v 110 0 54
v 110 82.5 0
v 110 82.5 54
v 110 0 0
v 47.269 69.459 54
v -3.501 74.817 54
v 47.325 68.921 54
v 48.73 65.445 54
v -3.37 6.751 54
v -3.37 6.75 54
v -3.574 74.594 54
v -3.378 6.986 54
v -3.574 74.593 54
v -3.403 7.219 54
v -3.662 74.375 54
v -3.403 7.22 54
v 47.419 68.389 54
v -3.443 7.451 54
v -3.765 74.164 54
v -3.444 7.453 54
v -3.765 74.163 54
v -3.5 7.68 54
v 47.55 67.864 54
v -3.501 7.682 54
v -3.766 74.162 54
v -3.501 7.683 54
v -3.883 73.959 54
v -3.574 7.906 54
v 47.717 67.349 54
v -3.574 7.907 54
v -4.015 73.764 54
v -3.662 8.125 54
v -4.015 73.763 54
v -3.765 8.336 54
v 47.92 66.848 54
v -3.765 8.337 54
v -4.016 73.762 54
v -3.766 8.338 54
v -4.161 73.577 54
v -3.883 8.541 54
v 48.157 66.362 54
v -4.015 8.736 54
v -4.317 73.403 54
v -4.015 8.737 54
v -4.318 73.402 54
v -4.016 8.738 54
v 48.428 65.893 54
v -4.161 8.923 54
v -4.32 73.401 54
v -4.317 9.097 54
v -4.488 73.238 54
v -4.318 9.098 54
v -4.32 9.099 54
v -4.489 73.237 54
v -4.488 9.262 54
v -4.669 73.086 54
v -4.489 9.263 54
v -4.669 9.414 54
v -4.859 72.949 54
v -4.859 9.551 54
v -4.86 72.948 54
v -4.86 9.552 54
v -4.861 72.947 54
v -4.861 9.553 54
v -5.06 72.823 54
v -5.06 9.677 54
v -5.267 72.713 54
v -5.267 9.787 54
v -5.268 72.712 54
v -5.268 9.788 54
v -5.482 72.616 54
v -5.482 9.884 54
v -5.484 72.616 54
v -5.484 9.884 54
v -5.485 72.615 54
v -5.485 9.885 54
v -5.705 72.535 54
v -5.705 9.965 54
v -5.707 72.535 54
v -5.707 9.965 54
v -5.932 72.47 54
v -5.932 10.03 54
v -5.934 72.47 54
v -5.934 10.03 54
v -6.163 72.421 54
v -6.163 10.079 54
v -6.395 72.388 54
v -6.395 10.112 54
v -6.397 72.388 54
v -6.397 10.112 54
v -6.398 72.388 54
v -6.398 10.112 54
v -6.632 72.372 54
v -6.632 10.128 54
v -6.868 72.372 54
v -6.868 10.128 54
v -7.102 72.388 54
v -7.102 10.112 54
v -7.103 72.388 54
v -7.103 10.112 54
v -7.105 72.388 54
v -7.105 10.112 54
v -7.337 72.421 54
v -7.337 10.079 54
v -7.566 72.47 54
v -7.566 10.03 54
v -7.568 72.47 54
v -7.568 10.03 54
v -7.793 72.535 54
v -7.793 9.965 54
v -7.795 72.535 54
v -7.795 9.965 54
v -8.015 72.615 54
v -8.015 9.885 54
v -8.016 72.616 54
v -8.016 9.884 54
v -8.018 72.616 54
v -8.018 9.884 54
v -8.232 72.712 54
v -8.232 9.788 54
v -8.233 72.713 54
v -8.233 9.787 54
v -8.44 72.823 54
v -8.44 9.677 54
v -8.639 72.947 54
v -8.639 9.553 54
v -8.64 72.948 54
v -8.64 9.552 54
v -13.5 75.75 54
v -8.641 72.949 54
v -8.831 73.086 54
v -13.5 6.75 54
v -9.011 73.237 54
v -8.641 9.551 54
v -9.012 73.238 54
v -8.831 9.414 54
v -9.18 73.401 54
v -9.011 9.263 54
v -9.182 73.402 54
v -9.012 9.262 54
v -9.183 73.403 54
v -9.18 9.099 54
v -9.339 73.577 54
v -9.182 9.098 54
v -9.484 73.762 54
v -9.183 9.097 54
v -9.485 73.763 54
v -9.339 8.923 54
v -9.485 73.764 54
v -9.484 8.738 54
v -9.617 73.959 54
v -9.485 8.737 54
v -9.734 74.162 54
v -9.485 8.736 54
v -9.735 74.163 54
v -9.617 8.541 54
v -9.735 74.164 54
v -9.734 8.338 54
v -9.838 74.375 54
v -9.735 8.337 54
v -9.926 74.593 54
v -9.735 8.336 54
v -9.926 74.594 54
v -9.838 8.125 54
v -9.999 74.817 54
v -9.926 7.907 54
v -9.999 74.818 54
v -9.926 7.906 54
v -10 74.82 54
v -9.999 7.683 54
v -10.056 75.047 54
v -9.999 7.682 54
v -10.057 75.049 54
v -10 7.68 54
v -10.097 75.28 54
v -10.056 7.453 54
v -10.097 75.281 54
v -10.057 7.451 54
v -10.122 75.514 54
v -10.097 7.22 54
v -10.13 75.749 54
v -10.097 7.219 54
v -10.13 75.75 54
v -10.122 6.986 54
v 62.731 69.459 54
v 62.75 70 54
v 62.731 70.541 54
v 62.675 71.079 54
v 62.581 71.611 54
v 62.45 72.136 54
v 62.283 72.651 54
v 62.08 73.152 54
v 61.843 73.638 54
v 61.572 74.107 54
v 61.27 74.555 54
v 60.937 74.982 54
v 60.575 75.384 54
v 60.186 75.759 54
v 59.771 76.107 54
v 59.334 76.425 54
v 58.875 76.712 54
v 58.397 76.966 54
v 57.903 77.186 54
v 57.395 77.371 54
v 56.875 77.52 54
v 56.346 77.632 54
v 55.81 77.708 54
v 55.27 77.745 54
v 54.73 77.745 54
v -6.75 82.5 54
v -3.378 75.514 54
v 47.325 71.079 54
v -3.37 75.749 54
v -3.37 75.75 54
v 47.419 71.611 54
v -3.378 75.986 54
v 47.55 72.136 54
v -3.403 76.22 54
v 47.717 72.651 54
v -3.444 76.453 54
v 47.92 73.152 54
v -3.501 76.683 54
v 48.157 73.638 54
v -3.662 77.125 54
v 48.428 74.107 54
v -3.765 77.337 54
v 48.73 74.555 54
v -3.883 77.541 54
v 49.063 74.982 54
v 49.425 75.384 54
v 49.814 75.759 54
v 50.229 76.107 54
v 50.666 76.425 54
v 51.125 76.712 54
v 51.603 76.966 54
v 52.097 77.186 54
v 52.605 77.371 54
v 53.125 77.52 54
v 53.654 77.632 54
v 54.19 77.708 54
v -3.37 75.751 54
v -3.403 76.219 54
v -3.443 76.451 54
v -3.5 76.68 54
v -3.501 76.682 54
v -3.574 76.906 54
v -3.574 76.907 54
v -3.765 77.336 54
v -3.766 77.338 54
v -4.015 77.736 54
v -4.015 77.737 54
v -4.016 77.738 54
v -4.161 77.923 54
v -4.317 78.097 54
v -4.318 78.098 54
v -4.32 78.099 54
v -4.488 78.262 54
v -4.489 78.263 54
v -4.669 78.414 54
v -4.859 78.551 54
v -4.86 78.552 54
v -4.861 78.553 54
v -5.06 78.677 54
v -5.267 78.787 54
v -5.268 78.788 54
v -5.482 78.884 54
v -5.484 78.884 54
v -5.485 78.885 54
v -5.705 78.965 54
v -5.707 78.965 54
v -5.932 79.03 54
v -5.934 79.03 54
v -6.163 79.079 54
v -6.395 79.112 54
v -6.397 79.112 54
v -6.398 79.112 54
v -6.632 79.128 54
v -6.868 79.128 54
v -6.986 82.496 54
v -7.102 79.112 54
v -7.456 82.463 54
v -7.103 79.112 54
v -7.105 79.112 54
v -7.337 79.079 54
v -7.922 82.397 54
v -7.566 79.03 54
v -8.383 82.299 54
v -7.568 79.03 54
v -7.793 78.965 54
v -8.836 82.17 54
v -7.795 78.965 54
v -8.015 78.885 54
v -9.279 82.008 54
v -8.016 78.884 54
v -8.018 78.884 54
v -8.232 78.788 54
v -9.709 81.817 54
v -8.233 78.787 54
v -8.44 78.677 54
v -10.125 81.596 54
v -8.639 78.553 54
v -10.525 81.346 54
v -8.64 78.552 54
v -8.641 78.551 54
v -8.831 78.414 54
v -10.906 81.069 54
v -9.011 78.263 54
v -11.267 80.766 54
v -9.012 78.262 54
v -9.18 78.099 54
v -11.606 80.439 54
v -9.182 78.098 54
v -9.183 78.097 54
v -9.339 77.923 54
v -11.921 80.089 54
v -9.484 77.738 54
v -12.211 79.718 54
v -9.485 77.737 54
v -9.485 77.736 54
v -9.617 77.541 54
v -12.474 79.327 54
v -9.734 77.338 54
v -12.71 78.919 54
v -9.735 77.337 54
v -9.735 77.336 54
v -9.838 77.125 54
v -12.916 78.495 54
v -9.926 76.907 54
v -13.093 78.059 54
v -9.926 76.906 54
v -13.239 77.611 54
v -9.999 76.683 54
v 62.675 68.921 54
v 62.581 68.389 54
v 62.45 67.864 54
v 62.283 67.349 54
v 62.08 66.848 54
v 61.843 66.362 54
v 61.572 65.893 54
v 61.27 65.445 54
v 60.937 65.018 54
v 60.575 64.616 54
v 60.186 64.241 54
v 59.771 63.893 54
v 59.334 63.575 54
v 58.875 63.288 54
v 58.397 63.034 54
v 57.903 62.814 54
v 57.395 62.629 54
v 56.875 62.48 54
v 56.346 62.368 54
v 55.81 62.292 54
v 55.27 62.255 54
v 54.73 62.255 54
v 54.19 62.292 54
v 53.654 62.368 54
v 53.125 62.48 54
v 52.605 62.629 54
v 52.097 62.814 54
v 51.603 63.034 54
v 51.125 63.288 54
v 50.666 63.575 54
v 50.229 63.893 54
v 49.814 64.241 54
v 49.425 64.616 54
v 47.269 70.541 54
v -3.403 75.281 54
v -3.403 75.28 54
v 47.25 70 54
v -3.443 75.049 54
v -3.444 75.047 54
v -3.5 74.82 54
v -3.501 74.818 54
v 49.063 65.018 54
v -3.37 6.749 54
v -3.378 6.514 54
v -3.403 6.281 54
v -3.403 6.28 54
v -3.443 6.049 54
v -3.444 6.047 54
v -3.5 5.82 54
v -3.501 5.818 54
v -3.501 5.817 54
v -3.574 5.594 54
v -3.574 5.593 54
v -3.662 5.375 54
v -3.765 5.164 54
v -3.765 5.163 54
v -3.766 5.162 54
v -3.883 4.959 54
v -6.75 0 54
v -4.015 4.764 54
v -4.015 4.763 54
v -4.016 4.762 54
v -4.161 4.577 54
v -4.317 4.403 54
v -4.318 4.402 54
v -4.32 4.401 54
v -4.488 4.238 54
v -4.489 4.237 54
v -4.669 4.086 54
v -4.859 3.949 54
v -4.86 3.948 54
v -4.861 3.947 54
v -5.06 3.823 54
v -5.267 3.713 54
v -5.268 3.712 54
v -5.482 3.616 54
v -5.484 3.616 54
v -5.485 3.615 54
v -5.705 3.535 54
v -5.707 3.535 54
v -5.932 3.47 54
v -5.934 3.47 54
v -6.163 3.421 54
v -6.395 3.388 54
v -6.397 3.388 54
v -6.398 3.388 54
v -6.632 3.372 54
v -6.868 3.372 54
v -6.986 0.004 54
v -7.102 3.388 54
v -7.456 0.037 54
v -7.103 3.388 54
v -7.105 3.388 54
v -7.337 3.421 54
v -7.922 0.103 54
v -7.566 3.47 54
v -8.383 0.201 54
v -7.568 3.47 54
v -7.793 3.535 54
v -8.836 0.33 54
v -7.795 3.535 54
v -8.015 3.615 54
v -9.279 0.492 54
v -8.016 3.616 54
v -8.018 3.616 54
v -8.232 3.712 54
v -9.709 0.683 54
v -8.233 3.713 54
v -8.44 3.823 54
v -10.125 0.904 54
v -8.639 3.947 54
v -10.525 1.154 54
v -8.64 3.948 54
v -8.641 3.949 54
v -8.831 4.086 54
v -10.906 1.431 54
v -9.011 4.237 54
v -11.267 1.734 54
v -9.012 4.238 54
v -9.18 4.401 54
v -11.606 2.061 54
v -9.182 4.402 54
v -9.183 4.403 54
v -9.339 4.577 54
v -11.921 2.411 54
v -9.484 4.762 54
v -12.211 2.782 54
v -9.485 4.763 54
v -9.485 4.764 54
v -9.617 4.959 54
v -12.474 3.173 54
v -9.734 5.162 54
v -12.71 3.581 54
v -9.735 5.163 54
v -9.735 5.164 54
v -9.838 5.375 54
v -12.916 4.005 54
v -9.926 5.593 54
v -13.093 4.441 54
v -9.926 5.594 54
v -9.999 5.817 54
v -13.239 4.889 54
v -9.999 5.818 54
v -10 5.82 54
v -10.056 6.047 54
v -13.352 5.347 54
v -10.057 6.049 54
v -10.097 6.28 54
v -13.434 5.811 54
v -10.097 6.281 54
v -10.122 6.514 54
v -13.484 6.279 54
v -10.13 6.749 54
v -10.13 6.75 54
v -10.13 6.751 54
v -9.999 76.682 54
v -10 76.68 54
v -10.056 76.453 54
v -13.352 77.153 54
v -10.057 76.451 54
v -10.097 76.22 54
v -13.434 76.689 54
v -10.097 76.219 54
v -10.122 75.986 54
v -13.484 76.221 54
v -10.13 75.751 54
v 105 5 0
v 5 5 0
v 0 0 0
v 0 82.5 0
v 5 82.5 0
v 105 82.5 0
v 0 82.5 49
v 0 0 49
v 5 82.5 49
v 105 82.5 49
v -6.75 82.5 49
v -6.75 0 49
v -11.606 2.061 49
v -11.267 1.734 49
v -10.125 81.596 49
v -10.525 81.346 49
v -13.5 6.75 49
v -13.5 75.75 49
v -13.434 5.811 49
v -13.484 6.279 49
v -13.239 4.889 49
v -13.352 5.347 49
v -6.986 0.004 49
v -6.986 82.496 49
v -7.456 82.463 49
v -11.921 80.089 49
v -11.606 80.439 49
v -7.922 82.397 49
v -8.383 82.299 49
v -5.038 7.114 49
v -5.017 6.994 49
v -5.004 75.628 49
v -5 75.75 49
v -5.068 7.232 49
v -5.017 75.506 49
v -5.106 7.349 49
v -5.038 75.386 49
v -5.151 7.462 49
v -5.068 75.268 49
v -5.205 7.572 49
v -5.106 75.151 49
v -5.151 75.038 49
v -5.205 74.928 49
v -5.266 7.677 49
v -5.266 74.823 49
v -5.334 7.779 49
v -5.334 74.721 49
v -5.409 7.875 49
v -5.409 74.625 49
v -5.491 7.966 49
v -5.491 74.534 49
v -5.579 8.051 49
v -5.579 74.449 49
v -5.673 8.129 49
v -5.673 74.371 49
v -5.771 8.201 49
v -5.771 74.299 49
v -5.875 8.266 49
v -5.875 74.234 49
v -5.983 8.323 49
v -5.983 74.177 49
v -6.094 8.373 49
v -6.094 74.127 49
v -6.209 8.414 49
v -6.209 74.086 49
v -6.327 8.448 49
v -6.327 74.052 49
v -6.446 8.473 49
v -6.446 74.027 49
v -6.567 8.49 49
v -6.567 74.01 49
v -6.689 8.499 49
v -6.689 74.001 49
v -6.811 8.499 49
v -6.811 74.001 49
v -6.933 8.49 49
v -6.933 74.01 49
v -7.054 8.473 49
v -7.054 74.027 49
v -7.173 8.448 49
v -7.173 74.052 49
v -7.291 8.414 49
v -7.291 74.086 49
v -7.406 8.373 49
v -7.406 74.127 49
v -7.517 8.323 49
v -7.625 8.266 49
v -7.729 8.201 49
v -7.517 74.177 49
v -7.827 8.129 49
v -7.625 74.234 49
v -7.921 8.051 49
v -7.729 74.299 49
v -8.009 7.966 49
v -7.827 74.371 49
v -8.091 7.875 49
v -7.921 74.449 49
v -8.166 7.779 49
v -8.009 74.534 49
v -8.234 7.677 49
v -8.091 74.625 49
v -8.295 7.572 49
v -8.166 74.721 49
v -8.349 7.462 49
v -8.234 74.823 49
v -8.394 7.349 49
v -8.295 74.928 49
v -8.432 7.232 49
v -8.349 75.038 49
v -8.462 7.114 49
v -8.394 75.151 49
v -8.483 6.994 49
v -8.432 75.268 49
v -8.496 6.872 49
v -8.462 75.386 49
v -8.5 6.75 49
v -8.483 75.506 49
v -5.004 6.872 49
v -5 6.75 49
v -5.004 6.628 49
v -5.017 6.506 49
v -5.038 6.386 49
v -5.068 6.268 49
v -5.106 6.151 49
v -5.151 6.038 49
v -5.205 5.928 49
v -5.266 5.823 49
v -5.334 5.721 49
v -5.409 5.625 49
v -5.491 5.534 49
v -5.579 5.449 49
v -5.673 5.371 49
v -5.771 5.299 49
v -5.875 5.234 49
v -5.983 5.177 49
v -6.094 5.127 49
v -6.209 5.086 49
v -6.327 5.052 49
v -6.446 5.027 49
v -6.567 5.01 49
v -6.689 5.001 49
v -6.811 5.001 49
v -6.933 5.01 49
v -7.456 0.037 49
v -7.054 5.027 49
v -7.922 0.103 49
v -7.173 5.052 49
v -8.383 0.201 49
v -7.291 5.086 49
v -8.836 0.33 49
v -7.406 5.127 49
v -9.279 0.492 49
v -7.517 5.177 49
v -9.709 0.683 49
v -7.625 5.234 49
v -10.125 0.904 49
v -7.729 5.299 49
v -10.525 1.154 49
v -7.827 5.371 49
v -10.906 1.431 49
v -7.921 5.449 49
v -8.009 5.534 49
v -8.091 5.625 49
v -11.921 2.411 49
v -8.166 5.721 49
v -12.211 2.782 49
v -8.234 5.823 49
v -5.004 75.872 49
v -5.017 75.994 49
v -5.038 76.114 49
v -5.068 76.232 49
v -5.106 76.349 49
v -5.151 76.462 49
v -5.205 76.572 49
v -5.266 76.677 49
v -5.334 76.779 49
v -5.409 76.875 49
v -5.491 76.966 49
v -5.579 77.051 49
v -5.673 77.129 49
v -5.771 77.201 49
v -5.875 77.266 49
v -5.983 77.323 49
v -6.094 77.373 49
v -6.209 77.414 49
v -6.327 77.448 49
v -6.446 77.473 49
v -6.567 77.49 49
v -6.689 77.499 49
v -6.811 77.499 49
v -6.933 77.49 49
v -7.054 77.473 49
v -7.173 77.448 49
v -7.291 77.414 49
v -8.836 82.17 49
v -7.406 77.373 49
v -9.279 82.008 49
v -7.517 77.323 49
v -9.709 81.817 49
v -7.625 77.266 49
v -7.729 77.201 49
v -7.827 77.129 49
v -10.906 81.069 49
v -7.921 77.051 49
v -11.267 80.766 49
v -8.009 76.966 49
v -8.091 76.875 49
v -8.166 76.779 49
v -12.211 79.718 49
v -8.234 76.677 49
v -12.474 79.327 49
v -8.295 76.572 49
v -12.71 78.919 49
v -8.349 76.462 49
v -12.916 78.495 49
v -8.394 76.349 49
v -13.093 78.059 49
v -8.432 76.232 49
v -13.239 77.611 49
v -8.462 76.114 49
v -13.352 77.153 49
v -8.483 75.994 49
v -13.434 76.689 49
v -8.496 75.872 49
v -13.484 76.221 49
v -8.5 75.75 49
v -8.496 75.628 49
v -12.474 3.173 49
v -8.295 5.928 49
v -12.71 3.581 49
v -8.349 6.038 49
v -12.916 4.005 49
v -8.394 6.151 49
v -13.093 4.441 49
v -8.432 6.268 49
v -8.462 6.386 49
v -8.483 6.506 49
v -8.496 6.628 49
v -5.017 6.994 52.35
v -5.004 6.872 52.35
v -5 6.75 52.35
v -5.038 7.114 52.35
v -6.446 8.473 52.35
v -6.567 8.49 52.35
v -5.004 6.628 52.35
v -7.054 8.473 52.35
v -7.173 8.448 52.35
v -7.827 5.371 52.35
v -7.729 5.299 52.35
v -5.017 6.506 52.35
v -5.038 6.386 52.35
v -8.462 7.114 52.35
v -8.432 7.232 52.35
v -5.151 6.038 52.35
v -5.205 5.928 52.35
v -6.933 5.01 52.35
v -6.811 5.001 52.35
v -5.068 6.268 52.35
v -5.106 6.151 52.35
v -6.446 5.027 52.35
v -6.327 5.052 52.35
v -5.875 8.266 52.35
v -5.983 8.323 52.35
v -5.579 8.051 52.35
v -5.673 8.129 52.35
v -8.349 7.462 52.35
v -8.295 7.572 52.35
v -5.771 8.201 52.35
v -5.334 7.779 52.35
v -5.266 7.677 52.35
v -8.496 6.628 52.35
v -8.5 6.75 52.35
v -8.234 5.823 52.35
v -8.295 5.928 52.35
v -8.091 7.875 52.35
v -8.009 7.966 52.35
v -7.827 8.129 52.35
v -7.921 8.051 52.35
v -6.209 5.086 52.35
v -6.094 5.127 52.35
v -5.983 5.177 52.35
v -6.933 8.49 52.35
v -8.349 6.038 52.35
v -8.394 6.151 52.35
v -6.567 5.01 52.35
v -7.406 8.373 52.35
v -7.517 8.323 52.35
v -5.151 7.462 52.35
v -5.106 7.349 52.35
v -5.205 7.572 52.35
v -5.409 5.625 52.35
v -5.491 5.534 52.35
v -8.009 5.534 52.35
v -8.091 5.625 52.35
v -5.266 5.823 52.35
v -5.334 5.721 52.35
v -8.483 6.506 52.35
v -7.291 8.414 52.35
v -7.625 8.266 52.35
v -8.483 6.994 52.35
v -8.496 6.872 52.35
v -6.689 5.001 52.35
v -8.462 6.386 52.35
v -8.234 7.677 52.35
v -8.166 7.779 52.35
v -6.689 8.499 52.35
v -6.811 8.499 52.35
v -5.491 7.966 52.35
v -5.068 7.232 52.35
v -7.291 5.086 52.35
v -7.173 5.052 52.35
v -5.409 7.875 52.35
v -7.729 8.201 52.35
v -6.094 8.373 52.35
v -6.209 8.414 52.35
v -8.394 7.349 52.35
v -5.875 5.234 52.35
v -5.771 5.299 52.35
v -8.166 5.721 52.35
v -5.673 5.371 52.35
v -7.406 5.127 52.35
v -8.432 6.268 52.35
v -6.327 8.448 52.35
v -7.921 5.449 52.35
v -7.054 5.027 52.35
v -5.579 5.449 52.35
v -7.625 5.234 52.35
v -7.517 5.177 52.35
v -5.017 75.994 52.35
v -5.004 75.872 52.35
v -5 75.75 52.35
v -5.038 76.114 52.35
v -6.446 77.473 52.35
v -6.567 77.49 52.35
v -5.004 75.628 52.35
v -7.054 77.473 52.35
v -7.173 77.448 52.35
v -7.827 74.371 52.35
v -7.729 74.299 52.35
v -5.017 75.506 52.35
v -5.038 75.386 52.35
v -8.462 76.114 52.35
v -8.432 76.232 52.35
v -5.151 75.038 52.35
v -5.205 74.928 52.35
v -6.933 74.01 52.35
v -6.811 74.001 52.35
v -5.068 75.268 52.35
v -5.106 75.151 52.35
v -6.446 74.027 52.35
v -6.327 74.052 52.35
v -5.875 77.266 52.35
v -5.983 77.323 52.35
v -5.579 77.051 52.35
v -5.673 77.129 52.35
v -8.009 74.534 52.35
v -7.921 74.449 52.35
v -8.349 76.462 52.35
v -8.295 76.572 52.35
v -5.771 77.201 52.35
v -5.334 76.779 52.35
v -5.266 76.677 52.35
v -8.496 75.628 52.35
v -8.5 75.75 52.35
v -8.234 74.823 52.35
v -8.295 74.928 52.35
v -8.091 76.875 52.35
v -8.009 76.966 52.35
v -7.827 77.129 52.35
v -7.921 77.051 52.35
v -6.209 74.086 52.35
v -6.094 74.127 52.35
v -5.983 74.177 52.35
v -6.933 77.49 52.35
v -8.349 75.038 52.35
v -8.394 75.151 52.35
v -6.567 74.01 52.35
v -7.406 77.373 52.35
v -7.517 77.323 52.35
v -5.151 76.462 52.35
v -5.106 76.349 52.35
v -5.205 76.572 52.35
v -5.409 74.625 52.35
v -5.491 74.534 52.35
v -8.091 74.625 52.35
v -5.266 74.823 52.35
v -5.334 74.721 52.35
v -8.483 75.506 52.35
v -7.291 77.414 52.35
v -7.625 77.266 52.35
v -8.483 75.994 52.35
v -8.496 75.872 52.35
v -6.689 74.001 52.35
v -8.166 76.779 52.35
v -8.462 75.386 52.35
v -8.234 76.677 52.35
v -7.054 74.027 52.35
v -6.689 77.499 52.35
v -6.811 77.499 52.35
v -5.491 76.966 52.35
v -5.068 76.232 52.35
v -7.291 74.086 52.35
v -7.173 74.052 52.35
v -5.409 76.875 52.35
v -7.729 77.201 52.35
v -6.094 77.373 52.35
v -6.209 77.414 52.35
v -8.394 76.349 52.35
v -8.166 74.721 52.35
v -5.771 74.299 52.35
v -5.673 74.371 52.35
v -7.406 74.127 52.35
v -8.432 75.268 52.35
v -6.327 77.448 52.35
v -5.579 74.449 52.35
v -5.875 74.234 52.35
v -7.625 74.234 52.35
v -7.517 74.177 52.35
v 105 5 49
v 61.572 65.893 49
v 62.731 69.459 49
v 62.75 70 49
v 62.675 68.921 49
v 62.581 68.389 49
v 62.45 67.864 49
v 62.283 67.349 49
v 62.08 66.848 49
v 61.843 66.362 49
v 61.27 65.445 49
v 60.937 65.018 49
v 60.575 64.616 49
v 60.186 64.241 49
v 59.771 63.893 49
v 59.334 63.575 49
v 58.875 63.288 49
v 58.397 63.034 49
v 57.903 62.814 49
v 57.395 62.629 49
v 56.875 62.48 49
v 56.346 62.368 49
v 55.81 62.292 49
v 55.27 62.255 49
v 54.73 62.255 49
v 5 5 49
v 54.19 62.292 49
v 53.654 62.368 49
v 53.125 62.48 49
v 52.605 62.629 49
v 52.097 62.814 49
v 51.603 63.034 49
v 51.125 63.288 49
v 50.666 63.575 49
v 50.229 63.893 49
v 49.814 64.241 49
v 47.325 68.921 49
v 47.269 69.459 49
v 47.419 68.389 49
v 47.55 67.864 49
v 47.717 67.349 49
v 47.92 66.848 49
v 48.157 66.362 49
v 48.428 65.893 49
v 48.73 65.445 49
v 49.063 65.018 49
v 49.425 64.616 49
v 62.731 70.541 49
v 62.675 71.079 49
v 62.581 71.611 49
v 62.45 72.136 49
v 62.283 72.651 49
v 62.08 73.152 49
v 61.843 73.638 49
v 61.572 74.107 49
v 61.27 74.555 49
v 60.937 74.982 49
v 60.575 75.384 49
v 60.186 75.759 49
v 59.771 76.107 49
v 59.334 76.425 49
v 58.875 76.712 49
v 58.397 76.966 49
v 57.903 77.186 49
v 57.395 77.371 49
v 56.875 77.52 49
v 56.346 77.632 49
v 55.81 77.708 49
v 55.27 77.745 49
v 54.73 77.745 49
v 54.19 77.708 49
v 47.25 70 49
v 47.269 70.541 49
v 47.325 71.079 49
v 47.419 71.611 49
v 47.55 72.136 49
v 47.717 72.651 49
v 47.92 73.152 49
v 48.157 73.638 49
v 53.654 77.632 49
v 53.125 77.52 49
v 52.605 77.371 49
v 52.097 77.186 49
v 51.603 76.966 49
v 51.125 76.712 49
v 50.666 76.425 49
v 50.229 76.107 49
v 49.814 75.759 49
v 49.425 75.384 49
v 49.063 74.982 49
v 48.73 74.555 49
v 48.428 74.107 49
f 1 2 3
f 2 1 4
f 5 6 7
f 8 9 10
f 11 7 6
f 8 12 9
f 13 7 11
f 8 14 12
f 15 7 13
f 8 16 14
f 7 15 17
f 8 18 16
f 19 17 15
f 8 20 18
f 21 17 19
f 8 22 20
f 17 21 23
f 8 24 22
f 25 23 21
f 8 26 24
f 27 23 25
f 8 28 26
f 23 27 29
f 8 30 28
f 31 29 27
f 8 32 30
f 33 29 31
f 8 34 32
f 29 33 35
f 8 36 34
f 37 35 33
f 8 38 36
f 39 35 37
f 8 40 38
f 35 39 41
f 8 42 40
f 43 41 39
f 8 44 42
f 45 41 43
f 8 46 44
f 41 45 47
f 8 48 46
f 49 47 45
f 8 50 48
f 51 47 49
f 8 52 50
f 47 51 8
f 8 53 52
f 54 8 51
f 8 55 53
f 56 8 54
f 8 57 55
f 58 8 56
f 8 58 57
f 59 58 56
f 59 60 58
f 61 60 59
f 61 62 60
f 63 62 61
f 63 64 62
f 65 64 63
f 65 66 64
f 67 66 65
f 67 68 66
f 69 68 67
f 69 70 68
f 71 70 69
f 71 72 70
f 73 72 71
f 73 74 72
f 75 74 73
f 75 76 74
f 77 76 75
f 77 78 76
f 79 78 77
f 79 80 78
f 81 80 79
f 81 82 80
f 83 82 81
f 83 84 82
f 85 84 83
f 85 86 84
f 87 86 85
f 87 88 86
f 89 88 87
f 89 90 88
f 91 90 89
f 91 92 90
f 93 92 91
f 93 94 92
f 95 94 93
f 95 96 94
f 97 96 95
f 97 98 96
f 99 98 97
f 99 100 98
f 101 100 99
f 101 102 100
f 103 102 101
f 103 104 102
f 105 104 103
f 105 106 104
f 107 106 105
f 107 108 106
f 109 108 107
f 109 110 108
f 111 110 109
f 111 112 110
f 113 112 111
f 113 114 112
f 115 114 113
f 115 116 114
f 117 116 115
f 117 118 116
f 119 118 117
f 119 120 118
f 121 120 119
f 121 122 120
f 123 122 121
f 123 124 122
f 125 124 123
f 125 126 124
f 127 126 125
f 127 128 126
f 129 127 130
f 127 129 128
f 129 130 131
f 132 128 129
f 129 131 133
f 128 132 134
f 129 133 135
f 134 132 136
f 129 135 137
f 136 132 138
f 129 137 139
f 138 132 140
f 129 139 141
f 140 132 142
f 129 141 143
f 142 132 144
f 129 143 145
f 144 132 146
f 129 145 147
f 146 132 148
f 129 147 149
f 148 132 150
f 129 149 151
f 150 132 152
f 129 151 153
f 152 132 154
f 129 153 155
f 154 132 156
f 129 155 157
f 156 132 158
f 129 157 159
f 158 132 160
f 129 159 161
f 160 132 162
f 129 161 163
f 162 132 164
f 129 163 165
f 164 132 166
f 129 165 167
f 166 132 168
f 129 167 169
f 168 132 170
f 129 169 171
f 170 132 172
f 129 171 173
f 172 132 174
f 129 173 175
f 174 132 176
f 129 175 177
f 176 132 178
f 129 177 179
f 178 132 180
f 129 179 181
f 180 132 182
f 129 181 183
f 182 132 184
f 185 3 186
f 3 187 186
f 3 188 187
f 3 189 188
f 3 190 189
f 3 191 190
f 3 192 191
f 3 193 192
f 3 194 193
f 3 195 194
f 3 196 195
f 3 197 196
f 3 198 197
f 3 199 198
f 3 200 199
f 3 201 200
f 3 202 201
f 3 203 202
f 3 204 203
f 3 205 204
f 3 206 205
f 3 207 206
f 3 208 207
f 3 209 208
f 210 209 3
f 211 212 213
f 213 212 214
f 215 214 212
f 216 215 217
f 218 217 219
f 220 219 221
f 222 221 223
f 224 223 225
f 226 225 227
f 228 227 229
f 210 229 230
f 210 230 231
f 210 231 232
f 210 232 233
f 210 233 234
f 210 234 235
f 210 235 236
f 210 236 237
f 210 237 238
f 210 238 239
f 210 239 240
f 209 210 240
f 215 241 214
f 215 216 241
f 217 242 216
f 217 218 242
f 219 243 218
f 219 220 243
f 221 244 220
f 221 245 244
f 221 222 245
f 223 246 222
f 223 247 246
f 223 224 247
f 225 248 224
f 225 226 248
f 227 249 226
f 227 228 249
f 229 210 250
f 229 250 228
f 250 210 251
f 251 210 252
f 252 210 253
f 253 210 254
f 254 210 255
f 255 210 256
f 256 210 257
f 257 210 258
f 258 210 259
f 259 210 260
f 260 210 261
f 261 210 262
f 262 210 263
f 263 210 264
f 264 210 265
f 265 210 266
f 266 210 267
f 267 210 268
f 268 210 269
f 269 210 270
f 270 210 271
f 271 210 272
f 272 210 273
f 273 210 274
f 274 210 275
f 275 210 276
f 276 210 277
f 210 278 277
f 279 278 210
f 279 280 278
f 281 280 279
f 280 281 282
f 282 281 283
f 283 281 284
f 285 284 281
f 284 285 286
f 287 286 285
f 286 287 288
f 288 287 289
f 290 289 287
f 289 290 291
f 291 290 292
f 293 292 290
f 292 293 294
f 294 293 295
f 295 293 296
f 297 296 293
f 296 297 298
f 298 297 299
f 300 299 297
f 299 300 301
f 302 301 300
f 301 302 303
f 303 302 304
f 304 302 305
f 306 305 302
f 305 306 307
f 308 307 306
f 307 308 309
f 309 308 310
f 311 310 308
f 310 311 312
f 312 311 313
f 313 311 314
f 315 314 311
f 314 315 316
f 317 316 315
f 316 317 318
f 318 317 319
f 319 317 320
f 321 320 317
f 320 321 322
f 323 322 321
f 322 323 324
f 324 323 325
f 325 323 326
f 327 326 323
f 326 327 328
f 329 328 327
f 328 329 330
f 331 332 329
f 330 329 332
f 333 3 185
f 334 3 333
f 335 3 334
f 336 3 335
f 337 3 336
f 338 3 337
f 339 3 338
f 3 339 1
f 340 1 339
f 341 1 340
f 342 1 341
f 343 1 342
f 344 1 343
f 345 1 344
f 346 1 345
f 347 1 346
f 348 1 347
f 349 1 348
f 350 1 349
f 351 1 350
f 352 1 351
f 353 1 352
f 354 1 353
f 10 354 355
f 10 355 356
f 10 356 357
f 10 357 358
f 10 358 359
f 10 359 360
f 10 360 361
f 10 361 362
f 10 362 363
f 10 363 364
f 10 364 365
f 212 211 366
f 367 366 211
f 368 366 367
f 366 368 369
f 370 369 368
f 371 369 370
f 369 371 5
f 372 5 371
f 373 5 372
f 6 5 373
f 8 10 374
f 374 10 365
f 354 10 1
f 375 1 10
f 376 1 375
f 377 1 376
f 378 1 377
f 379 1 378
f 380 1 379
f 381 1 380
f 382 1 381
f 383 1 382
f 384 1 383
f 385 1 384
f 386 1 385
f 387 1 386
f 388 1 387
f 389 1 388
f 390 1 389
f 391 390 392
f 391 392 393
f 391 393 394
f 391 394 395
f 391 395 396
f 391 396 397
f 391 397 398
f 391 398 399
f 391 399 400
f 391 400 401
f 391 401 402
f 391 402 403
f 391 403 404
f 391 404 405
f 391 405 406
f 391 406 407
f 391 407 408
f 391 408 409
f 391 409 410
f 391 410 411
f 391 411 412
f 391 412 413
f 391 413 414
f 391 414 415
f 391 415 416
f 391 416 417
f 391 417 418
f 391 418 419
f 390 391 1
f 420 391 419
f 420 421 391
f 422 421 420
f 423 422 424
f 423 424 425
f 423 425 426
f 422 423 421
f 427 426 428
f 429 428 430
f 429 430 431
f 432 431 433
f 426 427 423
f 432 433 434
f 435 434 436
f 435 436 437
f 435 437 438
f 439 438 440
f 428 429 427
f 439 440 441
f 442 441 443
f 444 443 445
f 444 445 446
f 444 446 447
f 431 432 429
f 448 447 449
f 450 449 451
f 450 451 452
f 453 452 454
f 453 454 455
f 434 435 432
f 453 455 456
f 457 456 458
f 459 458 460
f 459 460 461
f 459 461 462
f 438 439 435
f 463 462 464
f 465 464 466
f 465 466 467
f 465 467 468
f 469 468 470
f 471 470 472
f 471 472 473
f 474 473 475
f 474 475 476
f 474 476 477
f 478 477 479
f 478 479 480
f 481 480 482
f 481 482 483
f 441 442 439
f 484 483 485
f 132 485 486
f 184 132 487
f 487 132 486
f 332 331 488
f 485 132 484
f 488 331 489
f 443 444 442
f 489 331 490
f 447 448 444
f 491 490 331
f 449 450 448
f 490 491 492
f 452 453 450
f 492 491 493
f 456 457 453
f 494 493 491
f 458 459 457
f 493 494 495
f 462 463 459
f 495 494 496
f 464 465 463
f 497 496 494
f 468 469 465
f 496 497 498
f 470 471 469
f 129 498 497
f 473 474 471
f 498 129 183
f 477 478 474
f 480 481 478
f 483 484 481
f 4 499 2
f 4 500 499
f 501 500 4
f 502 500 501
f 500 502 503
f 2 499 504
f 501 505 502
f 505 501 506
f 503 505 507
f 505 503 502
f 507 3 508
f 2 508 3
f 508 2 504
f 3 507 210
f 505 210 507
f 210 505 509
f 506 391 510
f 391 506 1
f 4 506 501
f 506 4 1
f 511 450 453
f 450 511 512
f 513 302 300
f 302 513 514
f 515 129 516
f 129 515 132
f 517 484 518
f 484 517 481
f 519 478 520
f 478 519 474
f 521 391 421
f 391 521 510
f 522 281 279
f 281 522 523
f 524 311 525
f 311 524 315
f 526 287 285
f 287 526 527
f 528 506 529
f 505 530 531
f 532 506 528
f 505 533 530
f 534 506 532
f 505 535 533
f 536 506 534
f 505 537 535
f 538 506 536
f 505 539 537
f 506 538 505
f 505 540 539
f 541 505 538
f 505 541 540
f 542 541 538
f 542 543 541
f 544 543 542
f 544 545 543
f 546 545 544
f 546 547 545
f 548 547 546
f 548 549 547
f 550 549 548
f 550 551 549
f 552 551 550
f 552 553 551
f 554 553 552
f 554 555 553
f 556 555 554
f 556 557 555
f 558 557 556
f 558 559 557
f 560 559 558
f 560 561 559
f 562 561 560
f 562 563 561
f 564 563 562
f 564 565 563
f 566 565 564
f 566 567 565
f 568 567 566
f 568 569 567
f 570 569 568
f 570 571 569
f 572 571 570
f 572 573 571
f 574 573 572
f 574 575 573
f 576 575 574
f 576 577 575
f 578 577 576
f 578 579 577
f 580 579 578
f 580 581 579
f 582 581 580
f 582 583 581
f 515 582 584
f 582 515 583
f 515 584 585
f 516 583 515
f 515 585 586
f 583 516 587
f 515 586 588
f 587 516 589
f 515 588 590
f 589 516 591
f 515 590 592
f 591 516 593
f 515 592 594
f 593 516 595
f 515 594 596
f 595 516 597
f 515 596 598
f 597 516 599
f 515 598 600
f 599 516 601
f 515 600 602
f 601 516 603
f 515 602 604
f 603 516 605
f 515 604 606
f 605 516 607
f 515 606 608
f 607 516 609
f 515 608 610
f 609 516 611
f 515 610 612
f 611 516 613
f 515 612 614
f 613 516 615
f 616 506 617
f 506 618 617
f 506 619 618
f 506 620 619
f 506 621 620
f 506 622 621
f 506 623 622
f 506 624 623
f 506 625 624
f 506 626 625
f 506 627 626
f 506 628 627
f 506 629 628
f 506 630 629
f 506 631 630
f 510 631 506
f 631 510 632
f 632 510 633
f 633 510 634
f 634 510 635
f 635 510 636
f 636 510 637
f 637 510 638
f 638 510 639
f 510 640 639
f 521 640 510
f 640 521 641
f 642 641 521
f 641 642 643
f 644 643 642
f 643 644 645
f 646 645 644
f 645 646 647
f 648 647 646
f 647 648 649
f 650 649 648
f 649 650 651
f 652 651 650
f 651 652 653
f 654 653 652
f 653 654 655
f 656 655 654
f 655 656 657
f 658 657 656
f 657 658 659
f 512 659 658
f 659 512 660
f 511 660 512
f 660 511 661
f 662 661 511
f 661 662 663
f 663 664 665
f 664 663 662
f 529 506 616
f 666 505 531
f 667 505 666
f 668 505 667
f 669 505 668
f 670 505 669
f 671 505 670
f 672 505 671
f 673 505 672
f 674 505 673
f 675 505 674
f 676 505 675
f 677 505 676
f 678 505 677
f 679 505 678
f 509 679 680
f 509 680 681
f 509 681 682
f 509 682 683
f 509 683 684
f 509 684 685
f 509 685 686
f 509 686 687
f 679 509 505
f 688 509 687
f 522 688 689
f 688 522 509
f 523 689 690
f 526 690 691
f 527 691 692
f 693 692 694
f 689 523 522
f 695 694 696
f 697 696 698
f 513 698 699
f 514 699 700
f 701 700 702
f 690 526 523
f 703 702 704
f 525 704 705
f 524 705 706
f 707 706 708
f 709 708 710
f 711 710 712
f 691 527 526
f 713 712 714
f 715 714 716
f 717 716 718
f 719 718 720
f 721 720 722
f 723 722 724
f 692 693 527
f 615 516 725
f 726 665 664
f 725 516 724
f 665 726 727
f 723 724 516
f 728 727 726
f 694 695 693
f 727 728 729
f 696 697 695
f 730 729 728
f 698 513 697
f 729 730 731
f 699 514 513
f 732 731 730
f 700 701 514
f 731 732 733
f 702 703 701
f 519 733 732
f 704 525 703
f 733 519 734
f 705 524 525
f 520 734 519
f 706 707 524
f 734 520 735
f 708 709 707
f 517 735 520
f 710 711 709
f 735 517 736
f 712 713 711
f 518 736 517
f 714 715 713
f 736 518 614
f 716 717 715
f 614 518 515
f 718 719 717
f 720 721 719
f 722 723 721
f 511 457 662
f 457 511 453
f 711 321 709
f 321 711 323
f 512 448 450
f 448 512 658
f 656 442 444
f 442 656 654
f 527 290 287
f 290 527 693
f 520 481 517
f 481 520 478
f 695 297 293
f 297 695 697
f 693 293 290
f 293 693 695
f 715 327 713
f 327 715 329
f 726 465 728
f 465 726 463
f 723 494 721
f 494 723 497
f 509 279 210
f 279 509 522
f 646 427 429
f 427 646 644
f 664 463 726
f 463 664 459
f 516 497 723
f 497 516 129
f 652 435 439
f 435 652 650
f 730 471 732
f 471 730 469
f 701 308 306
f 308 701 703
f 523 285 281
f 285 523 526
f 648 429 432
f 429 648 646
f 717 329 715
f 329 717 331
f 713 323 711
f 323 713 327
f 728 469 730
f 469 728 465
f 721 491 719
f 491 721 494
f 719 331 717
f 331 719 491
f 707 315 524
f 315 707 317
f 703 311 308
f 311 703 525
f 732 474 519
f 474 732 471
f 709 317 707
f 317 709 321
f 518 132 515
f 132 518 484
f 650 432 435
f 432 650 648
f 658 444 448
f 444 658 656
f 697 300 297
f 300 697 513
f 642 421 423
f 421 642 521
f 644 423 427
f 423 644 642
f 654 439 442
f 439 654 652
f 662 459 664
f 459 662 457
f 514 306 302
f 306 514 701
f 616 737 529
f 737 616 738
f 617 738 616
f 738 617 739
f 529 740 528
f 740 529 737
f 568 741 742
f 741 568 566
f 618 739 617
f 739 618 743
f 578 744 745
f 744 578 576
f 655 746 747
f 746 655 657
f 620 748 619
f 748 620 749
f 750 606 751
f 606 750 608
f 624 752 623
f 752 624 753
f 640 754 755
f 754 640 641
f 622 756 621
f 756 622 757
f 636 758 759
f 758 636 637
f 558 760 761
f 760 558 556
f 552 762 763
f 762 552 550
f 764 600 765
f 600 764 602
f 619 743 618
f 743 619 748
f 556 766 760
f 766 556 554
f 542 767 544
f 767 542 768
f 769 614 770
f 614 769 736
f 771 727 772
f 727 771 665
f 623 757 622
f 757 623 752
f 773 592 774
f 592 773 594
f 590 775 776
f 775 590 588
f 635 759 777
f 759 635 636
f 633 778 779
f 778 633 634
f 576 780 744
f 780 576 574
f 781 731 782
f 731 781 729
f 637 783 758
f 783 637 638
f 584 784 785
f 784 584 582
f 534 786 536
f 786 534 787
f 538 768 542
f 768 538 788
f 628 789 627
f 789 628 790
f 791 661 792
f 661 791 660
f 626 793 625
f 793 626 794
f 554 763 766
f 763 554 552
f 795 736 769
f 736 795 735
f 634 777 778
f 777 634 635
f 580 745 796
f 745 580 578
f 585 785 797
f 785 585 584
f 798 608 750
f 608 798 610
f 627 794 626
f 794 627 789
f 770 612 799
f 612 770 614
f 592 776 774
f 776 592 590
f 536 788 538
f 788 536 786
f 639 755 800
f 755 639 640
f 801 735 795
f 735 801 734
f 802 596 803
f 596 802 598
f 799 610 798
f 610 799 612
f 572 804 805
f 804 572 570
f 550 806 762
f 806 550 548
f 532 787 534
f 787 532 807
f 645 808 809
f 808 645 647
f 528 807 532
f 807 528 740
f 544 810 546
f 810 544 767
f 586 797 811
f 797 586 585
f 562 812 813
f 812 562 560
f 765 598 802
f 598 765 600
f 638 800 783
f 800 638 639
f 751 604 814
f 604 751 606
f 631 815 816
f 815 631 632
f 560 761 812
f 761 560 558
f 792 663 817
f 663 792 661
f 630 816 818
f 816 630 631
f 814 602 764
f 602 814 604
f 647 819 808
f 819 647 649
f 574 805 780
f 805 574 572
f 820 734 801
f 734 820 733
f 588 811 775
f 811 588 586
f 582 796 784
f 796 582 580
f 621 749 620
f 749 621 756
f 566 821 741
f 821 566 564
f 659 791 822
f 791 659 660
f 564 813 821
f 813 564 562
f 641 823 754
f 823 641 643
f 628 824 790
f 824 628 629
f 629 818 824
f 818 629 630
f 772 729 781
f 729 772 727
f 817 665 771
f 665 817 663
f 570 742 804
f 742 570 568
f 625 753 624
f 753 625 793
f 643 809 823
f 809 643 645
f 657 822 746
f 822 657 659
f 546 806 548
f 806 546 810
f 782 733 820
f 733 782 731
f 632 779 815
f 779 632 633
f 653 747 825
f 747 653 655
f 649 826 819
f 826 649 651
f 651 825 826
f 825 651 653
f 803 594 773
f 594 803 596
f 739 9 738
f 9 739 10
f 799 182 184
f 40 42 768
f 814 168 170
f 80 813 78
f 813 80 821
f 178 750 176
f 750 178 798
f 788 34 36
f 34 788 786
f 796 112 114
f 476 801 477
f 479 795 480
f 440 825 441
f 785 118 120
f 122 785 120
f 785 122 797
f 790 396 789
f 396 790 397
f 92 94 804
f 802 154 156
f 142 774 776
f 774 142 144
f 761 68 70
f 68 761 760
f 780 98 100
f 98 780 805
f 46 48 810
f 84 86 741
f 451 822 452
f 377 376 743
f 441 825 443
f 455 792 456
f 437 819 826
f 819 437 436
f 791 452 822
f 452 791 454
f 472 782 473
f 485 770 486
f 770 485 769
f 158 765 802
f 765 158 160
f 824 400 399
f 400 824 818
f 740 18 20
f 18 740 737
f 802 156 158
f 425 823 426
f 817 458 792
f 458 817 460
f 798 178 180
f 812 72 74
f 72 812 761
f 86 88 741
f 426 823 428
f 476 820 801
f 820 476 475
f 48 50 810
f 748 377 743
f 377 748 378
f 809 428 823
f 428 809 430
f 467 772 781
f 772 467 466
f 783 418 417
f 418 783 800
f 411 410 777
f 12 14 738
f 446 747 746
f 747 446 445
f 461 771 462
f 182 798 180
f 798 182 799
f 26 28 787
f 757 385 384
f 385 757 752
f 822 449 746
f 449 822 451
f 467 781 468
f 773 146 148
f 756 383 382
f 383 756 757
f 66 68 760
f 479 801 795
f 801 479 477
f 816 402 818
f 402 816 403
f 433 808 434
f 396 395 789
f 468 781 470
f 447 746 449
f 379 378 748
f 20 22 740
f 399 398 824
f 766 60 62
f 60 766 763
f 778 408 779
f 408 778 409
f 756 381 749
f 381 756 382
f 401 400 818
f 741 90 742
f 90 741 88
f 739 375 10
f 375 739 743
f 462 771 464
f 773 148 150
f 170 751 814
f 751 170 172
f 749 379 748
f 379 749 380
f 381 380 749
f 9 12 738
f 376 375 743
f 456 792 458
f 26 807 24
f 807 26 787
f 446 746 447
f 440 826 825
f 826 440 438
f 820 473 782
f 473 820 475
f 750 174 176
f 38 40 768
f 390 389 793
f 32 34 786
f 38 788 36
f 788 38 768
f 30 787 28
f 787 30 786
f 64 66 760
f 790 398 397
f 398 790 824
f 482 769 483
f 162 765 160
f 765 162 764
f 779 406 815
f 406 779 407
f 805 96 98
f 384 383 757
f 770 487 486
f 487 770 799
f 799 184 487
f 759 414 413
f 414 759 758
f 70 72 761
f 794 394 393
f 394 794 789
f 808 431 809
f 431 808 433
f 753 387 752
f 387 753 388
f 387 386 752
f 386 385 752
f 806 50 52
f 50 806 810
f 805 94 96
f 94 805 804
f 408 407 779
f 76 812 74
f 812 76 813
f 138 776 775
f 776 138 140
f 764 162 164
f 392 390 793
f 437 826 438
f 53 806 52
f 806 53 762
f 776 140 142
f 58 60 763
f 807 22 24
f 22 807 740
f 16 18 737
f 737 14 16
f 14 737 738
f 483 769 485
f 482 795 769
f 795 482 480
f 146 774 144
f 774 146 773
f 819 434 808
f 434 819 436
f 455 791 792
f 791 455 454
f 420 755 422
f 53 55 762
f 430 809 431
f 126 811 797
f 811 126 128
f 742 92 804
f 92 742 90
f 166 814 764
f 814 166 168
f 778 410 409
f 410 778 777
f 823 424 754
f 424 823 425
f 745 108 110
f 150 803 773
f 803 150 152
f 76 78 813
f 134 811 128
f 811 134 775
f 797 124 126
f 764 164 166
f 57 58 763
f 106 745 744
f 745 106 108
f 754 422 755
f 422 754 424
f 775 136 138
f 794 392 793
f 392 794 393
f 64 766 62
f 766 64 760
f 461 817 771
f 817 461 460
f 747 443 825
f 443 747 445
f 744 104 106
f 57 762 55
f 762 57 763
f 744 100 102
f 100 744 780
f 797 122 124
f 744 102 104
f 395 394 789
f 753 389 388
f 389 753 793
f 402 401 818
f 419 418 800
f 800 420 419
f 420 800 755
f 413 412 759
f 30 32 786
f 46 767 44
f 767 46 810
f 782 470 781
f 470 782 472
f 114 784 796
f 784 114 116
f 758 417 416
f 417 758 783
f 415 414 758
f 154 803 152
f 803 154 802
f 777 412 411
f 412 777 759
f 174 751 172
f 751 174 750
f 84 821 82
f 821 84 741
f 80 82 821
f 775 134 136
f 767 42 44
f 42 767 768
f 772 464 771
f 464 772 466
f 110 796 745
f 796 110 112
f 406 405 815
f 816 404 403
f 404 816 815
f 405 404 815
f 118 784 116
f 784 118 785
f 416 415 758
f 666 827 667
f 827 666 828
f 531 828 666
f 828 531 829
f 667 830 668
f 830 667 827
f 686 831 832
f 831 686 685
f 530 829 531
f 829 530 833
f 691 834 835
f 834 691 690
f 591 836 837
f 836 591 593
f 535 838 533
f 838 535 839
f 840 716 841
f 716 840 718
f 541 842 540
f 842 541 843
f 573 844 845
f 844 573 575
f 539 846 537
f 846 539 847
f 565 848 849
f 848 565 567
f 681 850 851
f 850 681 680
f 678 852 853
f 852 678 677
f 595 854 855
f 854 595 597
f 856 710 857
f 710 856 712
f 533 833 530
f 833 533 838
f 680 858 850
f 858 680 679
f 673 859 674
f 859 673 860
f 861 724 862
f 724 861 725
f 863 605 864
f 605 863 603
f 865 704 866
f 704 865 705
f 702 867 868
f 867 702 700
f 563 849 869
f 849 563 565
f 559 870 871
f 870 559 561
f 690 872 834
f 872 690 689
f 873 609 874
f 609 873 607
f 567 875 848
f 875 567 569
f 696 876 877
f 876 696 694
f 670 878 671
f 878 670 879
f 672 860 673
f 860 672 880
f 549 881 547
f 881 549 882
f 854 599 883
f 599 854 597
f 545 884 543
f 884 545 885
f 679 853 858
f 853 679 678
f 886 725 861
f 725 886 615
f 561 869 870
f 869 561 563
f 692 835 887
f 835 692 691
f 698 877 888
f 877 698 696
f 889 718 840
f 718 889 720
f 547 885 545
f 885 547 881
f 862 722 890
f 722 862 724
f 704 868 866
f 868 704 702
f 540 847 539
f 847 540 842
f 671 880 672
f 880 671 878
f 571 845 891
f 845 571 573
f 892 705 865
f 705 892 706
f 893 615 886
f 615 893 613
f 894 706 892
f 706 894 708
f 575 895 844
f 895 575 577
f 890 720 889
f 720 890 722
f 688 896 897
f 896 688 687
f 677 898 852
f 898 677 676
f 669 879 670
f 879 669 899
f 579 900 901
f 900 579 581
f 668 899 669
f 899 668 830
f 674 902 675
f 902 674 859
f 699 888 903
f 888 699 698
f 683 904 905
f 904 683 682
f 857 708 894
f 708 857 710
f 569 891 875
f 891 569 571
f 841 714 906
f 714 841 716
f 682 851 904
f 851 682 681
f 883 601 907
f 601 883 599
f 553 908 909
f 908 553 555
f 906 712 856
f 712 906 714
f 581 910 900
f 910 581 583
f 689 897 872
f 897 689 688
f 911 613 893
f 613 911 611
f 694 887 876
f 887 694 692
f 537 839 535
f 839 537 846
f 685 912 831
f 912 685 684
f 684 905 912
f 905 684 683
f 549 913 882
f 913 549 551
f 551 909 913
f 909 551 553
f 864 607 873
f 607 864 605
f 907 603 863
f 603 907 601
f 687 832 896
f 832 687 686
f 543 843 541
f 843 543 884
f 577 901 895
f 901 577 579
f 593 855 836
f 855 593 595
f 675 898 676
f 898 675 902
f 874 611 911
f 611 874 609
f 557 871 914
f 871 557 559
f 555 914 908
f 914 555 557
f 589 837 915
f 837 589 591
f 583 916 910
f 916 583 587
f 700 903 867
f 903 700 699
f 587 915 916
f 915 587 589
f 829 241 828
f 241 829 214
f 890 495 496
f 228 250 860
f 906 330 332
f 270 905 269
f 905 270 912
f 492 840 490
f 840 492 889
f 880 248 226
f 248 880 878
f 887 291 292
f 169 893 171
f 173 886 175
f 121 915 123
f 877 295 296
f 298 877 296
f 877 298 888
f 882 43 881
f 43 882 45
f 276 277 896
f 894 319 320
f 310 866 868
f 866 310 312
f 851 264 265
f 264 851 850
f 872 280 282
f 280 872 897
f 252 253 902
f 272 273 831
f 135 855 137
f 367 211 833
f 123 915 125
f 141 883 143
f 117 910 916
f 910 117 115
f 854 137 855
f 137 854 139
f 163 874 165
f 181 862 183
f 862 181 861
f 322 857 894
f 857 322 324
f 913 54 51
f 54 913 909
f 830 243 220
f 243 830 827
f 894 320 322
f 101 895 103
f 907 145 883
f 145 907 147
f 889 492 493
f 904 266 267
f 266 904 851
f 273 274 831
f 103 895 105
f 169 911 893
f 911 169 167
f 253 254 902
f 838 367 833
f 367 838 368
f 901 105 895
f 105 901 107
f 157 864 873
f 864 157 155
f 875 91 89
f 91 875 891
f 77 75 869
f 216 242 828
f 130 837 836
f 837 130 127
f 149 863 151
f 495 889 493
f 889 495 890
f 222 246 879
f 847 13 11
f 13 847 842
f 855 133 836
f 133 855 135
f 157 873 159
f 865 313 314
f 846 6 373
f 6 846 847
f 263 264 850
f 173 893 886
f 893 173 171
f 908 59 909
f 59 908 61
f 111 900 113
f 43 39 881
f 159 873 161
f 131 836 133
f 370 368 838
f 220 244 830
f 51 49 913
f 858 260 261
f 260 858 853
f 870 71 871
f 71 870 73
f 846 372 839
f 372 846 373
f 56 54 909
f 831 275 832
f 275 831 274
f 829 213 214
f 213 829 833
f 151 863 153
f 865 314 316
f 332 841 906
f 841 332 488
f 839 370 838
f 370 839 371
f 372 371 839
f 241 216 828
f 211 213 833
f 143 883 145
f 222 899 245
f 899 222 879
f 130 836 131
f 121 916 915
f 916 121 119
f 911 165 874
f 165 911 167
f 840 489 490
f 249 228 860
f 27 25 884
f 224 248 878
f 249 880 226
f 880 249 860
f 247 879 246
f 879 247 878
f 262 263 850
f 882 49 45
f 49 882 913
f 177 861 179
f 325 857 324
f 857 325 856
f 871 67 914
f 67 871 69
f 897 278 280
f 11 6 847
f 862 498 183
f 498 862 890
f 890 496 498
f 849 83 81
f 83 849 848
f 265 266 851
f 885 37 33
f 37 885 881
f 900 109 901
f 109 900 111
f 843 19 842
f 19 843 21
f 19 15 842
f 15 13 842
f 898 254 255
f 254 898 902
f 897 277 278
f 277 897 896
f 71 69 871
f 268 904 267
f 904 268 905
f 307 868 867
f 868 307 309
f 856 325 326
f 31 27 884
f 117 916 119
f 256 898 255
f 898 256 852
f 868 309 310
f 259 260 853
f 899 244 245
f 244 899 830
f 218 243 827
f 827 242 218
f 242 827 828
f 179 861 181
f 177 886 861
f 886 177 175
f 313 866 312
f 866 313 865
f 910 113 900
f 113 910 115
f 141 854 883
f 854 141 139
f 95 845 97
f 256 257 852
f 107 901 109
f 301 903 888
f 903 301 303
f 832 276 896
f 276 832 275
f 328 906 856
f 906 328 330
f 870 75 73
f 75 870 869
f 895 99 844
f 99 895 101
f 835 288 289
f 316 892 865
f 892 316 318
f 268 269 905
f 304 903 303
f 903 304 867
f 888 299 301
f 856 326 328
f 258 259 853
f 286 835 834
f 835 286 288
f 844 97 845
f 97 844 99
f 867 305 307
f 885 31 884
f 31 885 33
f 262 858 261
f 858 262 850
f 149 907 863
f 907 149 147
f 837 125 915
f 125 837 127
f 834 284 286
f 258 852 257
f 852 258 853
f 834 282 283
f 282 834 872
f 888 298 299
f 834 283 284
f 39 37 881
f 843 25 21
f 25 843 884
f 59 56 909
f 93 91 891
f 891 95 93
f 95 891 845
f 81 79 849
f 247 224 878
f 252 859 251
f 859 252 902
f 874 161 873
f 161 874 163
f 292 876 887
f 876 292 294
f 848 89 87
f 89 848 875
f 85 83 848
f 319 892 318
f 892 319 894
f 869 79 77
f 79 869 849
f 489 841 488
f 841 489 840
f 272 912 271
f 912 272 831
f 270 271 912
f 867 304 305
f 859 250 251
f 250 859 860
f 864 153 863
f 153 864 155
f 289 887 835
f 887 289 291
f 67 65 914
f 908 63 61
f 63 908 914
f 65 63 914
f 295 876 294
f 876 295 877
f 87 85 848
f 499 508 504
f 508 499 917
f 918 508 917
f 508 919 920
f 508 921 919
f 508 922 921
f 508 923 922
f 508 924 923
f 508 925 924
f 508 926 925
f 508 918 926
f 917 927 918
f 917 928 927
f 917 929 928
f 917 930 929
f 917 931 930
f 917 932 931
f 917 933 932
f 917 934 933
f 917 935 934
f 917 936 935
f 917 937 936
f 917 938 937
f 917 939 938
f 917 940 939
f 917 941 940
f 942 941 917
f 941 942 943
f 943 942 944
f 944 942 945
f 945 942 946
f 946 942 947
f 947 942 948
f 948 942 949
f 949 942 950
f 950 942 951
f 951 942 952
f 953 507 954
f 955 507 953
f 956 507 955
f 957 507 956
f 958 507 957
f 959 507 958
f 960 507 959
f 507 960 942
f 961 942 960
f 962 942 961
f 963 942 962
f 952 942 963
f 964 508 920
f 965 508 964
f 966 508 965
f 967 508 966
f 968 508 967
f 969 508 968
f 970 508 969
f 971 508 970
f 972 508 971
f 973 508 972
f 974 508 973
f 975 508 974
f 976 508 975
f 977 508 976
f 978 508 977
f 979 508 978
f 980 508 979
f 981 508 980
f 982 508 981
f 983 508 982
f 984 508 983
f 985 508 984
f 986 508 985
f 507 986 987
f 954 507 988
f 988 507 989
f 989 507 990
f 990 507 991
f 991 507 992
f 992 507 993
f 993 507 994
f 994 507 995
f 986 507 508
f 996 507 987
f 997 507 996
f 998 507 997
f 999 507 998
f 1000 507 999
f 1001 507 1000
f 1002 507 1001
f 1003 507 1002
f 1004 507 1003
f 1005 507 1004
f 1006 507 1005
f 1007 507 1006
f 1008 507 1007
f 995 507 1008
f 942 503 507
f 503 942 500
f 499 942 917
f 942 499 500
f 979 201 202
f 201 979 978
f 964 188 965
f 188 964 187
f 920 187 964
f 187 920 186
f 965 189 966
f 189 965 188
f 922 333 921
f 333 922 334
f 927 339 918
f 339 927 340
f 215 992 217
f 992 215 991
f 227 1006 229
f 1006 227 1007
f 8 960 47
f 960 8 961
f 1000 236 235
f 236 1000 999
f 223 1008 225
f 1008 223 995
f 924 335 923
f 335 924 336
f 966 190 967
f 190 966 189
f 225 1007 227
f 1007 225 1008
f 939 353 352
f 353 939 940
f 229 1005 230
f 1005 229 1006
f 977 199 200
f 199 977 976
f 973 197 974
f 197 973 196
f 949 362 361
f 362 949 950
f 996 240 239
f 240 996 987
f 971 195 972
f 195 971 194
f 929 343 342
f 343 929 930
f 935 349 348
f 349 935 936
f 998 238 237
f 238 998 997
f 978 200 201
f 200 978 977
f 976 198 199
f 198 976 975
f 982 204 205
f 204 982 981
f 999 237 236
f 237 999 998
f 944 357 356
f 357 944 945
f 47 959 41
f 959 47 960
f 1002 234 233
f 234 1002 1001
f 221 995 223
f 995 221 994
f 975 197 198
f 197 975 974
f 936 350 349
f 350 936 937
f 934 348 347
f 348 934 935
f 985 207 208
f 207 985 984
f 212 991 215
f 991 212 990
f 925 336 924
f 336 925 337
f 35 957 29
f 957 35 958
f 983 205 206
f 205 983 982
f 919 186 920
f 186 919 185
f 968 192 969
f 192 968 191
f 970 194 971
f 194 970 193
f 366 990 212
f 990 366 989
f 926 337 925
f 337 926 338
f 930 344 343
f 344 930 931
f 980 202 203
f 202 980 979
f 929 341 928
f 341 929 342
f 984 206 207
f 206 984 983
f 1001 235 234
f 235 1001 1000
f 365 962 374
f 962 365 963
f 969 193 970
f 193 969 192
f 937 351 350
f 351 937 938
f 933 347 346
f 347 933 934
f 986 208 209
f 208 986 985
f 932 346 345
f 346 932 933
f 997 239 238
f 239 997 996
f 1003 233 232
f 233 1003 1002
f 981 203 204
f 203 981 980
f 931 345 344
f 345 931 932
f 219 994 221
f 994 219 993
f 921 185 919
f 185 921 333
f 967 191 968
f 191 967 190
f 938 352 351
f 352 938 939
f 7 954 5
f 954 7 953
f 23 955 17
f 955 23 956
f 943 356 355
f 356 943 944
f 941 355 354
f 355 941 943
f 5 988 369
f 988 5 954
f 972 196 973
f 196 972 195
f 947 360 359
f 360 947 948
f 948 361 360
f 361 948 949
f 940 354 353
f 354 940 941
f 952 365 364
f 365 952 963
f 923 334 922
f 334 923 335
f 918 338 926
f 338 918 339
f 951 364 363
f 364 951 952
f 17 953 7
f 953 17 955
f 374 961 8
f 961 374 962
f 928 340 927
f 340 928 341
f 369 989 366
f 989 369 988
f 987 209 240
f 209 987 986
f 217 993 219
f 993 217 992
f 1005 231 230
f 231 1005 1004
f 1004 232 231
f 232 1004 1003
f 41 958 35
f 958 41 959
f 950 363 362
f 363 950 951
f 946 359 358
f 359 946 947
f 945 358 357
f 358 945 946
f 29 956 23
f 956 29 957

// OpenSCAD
eps = 0.01;
$fn = 90;

// general parameters
wt = 5;

// bolt hole parameters
bh_x = 50;
bh_y = 65;
bh_d = 3.5;
bh_D = 15;

// bolt parameters
b_h = 2.4+0.25;
b_d = 5.8;

// PSU parameters
psu_x = 100;
psu_y = bh_y+bh_D/2+wt;
psu_z = 49;

// screw hole parameters
sh_d = 3.5;
sh_D = 6.8;

module bolt_holder()
{
    _D = bh_D+2*wt;
    difference()
    {
        union()
        {
            cylinder(d=bh_D,h=wt);
            translate([0,0,wt])
                cylinder(d=_D,h=2*wt); 
        }
        
        // bolt hole
        translate([0,0,-eps])cylinder(d=b_d,h=b_h+eps);
        
        // grapping part
        translate([-_D/2-eps,wt/2,2*wt])
            cube([_D+2*eps,_D,wt+eps]);
        translate([-_D/2-eps,-_D-wt/2,2*wt])
            cube([_D+2*eps,_D,wt+eps]);
    }
}

//bolt_holder();


module psu_holder()
{
    _x = 2*wt+psu_x;
    _y = wt+psu_y;
    _z = wt+psu_z;
    _d = sh_d+2*wt;
    difference()
    {
        union()
        {
            // main block
            cube([_x,_y,_z]);
                       
            // screw hole plate
            hull()
            {
                translate([-_d/2,_d/2,psu_z])
                    cylinder(d=_d,h=wt);
                translate([-_d/2,_y-_d/2,psu_z])
                    cylinder(d=_d,h=wt);
                translate([-_d/2,0,psu_z])
                    cube([_d/2,_y,wt]);
            }
        }
        
        // cut for the PSU
        translate([wt,wt,-eps])
            cube([psu_x,psu_y+eps,psu_z+eps]);
        
        // cut for bolt holder
        translate([bh_x+wt,bh_y+wt,psu_z-eps])
            cylinder(h=wt+2*eps,d=bh_D+0.5);
        
        // screw holes
        // closer hole
        positions = [   [-_d/2,_d/2,psu_z-eps],
                        [-_d/2,_y-_d/2,psu_z-eps]];
        for(i=[0:len(positions)-1])
        {
            translate(positions[i])
            {
                cylinder(d=sh_d,h=wt);
                _o = sh_D/2-sh_d/2;
                translate([0,0,wt-_o+eps])
                    cylinder(d1=sh_d,d2=sh_D,h=_o+2*eps);
            }
        }
    }
}

psu_holder();
